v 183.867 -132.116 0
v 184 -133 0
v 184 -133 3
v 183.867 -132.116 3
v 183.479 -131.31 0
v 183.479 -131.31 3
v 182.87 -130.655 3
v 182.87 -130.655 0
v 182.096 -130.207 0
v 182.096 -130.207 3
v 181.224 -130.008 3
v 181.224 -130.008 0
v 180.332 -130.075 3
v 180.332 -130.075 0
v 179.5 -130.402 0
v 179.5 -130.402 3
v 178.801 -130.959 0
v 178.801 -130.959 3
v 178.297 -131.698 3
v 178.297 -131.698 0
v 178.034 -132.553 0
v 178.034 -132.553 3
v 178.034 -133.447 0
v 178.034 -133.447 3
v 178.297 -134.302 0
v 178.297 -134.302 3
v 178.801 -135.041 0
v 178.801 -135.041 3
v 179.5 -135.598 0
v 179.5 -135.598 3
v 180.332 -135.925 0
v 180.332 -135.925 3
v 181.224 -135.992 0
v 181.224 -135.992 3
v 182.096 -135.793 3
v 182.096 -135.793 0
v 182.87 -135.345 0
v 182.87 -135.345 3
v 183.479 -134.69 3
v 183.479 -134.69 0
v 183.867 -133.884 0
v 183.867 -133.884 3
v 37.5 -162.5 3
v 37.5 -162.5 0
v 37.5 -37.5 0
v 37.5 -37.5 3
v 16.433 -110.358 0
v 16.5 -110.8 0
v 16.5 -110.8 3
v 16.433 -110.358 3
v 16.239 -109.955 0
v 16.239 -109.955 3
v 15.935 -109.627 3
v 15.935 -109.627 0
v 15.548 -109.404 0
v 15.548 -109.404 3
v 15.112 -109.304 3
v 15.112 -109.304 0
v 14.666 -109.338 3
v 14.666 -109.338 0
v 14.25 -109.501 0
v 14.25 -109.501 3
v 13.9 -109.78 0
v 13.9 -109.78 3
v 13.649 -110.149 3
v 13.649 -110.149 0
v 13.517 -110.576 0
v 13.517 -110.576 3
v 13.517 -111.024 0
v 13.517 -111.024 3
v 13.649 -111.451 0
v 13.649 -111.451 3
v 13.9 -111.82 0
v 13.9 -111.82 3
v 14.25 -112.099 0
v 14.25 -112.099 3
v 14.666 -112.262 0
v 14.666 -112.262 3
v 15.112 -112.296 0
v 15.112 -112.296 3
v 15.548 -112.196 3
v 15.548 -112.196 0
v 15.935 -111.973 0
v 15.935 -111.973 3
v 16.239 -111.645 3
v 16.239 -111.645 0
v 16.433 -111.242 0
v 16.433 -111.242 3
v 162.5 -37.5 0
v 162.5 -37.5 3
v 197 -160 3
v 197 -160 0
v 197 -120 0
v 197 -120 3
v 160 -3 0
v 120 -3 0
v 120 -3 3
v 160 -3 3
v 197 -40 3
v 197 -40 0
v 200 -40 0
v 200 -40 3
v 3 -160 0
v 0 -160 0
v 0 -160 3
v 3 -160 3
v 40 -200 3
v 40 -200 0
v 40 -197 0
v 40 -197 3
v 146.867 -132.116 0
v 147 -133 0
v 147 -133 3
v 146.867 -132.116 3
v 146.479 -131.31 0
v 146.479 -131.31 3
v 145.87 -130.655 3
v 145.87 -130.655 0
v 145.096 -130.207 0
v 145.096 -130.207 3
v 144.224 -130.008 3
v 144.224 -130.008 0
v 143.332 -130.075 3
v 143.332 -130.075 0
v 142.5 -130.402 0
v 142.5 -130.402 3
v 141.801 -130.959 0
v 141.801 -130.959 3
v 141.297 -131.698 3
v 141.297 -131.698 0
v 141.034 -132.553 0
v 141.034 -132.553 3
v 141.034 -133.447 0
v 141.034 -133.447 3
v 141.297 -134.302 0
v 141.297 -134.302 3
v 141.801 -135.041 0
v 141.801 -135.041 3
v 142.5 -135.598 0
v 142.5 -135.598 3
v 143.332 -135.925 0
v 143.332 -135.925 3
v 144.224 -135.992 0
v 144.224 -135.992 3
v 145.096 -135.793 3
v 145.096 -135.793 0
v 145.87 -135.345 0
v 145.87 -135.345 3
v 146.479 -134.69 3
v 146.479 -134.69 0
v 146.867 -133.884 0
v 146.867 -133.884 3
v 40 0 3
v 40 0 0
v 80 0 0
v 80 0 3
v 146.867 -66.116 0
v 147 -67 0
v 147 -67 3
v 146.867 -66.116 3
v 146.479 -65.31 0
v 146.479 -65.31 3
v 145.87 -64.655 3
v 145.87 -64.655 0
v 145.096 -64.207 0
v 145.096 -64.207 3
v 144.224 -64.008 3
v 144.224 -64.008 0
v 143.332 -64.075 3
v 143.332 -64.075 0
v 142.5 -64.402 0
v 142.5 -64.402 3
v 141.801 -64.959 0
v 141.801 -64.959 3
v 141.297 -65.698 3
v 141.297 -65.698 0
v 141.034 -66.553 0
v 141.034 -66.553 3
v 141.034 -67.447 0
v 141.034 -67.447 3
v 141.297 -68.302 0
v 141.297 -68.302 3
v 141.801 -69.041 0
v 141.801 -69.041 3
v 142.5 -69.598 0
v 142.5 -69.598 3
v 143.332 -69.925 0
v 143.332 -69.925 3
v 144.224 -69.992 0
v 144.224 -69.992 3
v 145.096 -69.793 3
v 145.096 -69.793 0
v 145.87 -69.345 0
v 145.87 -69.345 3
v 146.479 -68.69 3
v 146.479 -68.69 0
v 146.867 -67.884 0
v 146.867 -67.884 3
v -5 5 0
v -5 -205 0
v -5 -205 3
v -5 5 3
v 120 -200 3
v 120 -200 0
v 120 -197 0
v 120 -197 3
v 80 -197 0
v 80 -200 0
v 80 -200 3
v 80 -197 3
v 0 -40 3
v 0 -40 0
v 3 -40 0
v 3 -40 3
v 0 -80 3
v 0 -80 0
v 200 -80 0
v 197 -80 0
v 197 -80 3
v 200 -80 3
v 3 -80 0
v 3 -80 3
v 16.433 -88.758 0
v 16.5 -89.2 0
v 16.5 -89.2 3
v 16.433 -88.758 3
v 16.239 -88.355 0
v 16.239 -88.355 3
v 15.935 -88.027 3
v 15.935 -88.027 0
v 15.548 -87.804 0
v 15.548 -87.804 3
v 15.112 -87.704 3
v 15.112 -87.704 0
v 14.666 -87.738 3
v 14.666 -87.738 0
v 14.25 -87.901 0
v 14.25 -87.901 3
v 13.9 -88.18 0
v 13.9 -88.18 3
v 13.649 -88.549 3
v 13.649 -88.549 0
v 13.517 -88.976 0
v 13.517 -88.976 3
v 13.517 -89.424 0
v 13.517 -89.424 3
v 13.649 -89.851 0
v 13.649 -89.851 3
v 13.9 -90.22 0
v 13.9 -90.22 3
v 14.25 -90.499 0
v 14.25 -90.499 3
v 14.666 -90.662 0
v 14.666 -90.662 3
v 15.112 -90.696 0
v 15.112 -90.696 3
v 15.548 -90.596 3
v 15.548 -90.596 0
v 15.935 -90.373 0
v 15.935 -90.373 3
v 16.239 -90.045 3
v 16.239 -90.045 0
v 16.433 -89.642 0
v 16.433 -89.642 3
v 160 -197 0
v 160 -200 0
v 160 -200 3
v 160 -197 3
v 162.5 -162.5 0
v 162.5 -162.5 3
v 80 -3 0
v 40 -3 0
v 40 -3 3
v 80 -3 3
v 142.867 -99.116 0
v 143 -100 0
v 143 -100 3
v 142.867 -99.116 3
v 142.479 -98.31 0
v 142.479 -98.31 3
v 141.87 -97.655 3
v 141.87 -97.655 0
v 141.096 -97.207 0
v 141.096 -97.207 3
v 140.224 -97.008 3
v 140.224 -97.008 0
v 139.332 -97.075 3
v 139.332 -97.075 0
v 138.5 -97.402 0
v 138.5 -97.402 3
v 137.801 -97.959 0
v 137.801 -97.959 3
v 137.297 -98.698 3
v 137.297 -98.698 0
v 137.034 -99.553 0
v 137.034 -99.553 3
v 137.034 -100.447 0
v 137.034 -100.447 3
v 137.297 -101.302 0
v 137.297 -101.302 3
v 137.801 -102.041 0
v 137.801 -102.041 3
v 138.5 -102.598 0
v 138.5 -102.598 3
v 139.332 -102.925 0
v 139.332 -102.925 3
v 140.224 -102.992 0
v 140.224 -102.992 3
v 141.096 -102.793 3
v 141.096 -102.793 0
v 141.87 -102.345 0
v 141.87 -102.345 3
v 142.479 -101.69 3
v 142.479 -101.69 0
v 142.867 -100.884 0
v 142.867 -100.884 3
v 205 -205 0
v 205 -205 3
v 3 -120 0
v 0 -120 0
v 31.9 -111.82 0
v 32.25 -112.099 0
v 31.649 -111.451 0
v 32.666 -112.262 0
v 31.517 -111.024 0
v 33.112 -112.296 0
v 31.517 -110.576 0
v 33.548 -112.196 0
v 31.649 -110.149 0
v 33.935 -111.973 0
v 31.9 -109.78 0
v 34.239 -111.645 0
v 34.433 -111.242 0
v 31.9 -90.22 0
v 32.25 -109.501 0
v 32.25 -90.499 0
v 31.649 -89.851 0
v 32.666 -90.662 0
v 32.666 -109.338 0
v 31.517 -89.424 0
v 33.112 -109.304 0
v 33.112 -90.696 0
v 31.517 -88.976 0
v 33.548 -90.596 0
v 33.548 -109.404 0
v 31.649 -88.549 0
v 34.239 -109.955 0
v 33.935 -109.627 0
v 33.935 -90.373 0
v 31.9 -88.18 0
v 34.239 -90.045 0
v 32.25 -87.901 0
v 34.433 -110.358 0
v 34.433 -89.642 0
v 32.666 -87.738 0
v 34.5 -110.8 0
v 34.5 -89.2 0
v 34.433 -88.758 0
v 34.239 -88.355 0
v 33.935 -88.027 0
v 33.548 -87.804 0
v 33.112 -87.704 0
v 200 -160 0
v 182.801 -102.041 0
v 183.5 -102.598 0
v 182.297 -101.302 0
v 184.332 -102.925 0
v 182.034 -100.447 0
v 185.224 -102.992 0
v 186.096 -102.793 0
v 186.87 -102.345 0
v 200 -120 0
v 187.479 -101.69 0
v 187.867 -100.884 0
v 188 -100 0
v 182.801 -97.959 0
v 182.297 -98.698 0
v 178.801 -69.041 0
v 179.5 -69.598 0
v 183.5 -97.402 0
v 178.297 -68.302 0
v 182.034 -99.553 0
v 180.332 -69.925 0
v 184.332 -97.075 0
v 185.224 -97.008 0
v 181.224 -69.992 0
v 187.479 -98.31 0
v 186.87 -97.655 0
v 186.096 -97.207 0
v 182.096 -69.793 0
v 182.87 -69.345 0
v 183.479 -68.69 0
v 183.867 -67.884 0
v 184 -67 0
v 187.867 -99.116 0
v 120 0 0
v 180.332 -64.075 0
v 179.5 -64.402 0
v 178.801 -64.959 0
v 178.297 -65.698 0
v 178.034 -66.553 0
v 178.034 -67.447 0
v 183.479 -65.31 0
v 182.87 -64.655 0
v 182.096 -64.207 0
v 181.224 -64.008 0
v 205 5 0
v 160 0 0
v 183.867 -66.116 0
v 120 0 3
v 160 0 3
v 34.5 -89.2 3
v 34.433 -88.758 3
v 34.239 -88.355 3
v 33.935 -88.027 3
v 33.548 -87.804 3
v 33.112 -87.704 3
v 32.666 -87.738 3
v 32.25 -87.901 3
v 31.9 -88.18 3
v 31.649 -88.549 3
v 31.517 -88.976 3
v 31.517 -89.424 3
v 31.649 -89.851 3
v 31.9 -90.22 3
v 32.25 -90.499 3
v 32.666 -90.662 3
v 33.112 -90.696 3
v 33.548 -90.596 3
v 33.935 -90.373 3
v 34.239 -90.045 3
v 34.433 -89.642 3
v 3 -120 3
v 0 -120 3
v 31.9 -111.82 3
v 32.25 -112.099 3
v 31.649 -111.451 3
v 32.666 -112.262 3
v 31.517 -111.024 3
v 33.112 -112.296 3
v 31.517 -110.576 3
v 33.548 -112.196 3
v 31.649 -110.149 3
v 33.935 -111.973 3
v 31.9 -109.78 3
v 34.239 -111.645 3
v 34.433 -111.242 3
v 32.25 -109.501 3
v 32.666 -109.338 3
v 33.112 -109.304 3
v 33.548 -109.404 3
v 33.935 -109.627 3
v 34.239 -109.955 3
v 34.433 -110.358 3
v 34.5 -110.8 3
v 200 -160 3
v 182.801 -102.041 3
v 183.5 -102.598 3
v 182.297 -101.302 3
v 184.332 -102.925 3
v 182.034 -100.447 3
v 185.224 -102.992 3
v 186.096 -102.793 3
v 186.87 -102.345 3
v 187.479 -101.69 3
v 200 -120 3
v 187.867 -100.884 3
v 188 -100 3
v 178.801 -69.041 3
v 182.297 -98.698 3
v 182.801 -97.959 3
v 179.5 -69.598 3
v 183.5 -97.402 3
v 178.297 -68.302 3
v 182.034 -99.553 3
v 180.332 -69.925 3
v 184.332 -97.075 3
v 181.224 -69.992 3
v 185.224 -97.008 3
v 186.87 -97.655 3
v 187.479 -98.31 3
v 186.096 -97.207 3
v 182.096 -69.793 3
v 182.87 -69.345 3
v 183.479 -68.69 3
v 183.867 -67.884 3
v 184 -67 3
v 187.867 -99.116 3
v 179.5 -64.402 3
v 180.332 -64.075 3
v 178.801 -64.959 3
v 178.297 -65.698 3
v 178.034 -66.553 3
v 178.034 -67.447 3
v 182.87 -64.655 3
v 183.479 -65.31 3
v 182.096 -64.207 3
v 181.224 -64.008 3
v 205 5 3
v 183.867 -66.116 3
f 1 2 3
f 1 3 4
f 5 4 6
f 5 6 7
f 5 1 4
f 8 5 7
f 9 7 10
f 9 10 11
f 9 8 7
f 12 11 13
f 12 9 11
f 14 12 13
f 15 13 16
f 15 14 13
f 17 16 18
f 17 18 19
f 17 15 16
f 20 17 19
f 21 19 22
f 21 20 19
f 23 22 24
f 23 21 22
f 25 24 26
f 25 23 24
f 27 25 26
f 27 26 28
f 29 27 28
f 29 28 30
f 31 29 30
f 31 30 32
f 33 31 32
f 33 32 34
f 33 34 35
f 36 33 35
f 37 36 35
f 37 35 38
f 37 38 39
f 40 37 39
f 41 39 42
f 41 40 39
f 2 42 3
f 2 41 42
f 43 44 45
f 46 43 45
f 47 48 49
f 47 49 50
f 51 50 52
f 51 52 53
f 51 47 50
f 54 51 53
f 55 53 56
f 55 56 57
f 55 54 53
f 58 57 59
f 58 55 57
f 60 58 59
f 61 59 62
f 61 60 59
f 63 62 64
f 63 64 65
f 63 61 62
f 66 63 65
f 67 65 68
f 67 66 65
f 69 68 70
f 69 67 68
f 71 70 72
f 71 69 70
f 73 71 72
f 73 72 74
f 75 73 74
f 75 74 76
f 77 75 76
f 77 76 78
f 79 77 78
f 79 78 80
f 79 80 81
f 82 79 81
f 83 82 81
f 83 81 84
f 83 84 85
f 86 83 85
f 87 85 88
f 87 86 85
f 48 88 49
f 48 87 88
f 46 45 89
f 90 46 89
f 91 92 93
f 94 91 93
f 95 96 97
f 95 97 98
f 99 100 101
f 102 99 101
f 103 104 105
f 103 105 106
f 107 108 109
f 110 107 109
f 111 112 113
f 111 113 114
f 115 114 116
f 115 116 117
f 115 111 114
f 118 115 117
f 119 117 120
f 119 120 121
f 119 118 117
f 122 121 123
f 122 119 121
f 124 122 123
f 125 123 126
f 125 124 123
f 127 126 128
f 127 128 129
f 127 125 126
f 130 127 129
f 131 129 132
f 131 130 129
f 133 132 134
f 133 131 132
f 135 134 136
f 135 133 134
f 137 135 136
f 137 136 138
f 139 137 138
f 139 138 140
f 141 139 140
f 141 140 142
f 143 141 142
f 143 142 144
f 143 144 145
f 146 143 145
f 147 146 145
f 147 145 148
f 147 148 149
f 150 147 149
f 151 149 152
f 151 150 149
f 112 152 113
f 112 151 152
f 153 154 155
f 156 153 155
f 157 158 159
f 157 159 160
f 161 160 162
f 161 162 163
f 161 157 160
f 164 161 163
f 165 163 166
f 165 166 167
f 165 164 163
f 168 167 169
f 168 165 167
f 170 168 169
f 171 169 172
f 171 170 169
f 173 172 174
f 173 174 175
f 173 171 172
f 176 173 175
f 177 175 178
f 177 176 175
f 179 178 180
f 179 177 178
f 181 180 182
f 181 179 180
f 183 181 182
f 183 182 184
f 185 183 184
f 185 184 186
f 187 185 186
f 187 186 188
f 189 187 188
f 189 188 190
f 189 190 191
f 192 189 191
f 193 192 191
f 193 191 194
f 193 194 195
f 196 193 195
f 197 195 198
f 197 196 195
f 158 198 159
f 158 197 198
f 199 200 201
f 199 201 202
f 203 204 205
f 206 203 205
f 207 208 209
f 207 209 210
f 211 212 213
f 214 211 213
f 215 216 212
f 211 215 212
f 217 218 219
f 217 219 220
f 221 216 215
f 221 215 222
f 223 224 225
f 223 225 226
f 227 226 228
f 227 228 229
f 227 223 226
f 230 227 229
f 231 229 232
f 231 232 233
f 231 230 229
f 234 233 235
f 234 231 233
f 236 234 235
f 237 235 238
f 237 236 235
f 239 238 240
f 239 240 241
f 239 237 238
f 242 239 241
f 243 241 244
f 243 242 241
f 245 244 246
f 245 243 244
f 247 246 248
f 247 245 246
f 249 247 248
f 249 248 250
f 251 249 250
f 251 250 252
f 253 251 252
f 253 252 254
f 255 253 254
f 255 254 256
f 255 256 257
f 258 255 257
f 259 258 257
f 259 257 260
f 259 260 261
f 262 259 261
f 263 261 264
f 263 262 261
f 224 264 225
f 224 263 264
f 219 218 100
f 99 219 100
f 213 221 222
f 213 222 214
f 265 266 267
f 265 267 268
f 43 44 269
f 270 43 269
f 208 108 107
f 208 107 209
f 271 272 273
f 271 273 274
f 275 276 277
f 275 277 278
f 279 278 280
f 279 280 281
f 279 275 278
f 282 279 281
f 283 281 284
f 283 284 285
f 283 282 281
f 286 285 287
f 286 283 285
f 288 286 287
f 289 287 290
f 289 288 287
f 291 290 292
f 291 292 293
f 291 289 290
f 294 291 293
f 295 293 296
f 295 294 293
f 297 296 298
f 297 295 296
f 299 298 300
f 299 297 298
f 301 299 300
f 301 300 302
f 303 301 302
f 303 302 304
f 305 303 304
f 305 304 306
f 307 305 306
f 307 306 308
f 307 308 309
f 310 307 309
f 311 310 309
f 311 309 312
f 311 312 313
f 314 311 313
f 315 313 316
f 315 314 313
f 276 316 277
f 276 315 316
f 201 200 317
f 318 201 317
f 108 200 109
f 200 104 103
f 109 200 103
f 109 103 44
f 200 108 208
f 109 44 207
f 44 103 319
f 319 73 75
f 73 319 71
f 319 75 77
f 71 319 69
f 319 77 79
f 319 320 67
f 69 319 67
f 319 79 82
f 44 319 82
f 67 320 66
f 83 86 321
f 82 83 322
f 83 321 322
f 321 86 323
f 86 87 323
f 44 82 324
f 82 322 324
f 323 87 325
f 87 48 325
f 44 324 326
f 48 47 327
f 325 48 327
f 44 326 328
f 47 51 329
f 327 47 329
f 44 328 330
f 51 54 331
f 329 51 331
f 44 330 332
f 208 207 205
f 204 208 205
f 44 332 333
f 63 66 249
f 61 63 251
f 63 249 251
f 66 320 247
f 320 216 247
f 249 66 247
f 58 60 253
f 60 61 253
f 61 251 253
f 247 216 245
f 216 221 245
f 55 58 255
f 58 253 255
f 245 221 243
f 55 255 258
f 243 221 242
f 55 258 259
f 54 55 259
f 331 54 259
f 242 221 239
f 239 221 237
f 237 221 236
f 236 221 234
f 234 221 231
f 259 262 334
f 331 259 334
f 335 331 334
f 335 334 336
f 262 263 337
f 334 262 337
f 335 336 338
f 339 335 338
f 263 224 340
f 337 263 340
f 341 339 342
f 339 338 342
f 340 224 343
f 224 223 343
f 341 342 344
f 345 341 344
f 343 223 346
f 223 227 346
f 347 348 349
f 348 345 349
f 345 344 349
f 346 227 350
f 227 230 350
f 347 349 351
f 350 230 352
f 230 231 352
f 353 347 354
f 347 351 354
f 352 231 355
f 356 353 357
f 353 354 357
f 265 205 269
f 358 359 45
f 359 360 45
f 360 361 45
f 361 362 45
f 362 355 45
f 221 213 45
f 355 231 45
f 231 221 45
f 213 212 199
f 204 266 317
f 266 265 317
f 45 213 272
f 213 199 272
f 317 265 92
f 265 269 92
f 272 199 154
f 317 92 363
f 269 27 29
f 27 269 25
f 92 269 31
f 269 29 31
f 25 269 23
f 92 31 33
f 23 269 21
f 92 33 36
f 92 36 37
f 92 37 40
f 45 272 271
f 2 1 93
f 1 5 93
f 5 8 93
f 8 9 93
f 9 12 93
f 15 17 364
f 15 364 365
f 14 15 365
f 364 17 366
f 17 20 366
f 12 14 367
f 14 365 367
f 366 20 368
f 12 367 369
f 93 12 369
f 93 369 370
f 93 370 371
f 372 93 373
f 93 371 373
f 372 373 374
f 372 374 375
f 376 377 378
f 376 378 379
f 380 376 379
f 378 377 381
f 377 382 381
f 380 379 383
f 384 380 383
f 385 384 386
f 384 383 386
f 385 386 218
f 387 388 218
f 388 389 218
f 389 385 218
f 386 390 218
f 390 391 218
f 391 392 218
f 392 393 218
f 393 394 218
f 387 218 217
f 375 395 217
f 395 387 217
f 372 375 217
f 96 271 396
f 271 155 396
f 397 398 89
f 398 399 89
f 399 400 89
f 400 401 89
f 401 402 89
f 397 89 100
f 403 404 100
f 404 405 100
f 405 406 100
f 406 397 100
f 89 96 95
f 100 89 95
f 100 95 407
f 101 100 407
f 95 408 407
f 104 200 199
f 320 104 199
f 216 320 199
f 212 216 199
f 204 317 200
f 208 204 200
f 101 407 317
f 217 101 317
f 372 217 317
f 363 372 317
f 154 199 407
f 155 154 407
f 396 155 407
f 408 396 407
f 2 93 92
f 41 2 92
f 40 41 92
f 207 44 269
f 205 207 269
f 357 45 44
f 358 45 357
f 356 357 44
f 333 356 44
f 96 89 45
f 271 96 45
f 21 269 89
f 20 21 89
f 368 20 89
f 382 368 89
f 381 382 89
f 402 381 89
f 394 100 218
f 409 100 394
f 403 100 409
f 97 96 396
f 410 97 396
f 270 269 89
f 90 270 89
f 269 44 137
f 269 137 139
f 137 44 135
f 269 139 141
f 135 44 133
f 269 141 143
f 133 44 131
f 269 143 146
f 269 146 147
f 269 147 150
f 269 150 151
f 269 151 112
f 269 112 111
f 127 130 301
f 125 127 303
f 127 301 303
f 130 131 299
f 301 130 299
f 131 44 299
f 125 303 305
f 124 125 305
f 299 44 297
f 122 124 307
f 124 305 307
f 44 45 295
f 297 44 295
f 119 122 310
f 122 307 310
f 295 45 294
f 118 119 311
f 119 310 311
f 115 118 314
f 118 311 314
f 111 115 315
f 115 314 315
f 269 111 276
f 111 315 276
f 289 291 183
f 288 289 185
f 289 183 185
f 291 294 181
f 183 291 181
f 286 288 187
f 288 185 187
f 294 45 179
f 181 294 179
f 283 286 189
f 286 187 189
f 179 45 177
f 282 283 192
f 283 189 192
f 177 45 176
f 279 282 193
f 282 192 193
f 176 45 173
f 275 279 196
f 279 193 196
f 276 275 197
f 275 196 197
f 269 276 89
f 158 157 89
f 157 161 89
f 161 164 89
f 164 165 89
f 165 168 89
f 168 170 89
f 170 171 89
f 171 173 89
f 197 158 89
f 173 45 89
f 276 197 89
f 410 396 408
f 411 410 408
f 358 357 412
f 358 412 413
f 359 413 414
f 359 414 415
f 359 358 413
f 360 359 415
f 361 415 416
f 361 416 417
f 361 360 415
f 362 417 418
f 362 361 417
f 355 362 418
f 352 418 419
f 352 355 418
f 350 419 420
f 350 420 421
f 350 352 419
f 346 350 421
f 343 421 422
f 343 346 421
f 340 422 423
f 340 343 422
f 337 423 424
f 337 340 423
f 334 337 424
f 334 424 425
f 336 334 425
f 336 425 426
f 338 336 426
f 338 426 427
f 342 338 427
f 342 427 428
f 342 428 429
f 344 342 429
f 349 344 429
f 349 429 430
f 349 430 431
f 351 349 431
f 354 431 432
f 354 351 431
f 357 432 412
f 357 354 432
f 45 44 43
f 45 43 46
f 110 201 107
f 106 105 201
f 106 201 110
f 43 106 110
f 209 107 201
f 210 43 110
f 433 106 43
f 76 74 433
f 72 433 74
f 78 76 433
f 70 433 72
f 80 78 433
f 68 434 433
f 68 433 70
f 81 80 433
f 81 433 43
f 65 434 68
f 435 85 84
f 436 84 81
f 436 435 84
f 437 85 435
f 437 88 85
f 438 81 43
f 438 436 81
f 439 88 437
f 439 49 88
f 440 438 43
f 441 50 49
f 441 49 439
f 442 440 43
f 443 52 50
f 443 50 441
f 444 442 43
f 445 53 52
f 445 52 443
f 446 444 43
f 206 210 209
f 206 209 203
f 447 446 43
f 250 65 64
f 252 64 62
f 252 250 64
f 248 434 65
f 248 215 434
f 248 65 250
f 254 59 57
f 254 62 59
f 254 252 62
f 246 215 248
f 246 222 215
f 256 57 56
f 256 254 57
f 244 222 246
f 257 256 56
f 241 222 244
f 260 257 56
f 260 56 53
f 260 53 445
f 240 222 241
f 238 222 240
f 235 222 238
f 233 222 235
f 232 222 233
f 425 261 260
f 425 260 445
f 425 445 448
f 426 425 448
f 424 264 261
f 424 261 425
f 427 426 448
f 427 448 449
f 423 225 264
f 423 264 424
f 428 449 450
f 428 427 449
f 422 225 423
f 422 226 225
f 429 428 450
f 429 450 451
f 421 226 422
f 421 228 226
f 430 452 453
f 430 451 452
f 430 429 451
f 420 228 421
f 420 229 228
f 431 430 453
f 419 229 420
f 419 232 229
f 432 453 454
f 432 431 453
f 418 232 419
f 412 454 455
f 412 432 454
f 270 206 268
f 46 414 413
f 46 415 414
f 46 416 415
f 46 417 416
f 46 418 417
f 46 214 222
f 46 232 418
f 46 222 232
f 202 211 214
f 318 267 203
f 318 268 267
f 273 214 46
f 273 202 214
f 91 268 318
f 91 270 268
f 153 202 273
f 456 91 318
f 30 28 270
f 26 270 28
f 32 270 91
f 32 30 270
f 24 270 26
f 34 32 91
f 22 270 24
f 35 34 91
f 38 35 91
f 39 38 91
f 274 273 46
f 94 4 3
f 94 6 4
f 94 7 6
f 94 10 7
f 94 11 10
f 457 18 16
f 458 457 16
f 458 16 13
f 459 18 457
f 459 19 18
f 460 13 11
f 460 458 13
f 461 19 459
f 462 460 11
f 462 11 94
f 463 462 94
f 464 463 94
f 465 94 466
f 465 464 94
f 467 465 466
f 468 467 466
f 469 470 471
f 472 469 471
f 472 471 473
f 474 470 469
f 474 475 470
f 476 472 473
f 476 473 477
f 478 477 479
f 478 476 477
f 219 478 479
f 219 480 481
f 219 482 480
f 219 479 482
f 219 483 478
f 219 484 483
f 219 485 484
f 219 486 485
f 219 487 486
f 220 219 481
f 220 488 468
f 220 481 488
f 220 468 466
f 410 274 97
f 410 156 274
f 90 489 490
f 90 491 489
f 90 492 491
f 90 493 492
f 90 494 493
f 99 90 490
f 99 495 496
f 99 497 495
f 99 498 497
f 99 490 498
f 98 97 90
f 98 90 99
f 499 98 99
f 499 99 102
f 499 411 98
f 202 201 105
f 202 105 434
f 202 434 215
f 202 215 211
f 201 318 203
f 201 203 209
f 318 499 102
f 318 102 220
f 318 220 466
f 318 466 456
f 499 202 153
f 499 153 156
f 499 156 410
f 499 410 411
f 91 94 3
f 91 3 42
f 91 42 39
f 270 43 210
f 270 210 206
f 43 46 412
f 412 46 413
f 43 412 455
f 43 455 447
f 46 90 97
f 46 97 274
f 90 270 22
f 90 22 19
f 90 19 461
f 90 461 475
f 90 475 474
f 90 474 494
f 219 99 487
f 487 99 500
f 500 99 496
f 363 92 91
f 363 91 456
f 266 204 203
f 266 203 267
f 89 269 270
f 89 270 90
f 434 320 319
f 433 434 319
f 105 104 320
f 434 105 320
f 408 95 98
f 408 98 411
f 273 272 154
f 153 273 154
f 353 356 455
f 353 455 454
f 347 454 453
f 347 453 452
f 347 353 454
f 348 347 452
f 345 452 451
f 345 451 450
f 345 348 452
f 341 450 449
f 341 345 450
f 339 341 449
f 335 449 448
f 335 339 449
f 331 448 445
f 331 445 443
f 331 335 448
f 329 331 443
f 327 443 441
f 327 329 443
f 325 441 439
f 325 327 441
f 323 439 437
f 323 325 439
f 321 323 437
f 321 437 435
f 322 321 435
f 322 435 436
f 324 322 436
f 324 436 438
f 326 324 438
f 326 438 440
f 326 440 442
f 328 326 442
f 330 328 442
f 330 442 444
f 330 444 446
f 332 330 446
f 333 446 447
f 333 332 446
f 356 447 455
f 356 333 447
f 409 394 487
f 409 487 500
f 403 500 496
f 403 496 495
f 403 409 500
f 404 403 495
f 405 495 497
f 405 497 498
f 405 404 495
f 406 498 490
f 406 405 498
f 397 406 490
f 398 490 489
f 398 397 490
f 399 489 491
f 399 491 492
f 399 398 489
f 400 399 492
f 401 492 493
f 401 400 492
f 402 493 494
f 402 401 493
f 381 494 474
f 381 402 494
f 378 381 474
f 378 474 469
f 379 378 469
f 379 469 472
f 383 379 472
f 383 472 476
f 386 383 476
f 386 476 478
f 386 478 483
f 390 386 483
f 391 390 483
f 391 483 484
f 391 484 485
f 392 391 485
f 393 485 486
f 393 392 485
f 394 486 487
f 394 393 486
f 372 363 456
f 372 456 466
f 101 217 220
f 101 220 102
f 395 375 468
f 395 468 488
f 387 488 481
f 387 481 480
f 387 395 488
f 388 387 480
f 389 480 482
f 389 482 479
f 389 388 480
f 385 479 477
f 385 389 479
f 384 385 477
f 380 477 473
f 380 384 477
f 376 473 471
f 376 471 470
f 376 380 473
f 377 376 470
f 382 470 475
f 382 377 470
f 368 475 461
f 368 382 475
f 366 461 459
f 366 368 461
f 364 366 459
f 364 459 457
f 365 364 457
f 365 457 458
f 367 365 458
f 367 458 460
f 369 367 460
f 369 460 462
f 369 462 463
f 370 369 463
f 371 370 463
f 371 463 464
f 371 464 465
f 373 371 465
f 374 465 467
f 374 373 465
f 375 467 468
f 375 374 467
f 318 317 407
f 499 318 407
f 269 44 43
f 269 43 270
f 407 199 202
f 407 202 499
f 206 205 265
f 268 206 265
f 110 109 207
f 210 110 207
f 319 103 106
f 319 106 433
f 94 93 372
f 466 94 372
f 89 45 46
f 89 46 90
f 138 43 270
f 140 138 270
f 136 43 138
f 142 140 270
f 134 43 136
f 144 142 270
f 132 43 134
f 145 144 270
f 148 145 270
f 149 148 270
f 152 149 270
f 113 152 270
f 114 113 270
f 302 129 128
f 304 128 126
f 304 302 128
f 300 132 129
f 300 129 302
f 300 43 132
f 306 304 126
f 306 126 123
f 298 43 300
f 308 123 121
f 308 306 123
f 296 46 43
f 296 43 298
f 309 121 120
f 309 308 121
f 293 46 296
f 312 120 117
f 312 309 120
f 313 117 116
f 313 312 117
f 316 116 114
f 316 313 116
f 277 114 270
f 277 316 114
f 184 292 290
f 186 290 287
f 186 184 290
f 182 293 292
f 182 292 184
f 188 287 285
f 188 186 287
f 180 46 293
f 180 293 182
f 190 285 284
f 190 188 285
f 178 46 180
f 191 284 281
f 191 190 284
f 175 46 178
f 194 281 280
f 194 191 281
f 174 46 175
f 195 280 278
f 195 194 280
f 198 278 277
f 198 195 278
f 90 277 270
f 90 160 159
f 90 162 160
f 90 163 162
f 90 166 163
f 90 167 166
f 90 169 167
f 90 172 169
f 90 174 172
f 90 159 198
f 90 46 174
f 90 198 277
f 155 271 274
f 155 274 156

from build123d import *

# Parameters (mm, degrees)
SKETCH_1_W      = 210
SKETCH_1_H      = 210
SKETCH_1_W_2    = 3
SKETCH_1_H_2    = 40
SKETCH_1_W_3    = 40
SKETCH_1_H_3    = 3
SKETCH_1_W_4    = 125
SKETCH_1_H_4    = 125
SKETCH_1_R      = 1.5
SKETCH_1_R_2    = 3
EXTRUDE_1_DEPTH = 3
SKETCH_1_3_W    = 125
SKETCH_1_3_H    = 125
SKETCH_1_3_R    = 3
EXTRUDE_2_DEPTH = 3


with BuildPart() as part:
    # 草图1 → 凸台-拉伸1 (new body)
    with BuildSketch(Plane.XY):
        with Locations((100, -100)):
            Rectangle(SKETCH_1_W, SKETCH_1_H)
        with Locations((1.5, -60)):
            Rectangle(SKETCH_1_W_2, SKETCH_1_H_2, mode=Mode.SUBTRACT)
        with Locations((60, -1.5)):
            Rectangle(SKETCH_1_W_3, SKETCH_1_H_3, mode=Mode.SUBTRACT)
        with Locations((100, -100)):
            Rectangle(SKETCH_1_W_4, SKETCH_1_H_4, mode=Mode.SUBTRACT)
        with Locations((1.5, -140)):
            Rectangle(SKETCH_1_W_2, SKETCH_1_H_2, mode=Mode.SUBTRACT)
        with Locations((140, -1.5)):
            Rectangle(SKETCH_1_W_3, SKETCH_1_H_3, mode=Mode.SUBTRACT)
        with Locations((198.5, -60)):
            Rectangle(SKETCH_1_W_2, SKETCH_1_H_2, mode=Mode.SUBTRACT)
        with Locations((33, -89.2)):
            Circle(SKETCH_1_R, mode=Mode.SUBTRACT)
        with Locations((15, -89.2)):
            Circle(SKETCH_1_R, mode=Mode.SUBTRACT)
        with Locations((60, -198.5)):
            Rectangle(SKETCH_1_W_3, SKETCH_1_H_3, mode=Mode.SUBTRACT)
        with Locations((140, -198.5)):
            Rectangle(SKETCH_1_W_3, SKETCH_1_H_3, mode=Mode.SUBTRACT)
        with Locations((198.5, -140)):
            Rectangle(SKETCH_1_W_2, SKETCH_1_H_2, mode=Mode.SUBTRACT)
        with Locations((181, -67)):
            Circle(SKETCH_1_R_2, mode=Mode.SUBTRACT)
        with Locations((185, -100)):
            Circle(SKETCH_1_R_2, mode=Mode.SUBTRACT)
        with Locations((33, -110.8)):
            Circle(SKETCH_1_R, mode=Mode.SUBTRACT)
        with Locations((15, -110.8)):
            Circle(SKETCH_1_R, mode=Mode.SUBTRACT)
        with Locations((181, -133)):
            Circle(SKETCH_1_R_2, mode=Mode.SUBTRACT)
    extrude(amount=EXTRUDE_1_DEPTH)


with BuildPart() as body_2:
    # 草图1<3> → 凸台-拉伸2 (new body)
    with BuildSketch(Plane.XY):
        with Locations((100, -100)):
            Rectangle(SKETCH_1_3_W, SKETCH_1_3_H)
        with Locations((144, -67)):
            Circle(SKETCH_1_3_R, mode=Mode.SUBTRACT)
        with Locations((140, -100)):
            Circle(SKETCH_1_3_R, mode=Mode.SUBTRACT)
        with Locations((144, -133)):
            Circle(SKETCH_1_3_R, mode=Mode.SUBTRACT)
    extrude(amount=EXTRUDE_2_DEPTH)


solid = Compound([part.part, body_2.part])
